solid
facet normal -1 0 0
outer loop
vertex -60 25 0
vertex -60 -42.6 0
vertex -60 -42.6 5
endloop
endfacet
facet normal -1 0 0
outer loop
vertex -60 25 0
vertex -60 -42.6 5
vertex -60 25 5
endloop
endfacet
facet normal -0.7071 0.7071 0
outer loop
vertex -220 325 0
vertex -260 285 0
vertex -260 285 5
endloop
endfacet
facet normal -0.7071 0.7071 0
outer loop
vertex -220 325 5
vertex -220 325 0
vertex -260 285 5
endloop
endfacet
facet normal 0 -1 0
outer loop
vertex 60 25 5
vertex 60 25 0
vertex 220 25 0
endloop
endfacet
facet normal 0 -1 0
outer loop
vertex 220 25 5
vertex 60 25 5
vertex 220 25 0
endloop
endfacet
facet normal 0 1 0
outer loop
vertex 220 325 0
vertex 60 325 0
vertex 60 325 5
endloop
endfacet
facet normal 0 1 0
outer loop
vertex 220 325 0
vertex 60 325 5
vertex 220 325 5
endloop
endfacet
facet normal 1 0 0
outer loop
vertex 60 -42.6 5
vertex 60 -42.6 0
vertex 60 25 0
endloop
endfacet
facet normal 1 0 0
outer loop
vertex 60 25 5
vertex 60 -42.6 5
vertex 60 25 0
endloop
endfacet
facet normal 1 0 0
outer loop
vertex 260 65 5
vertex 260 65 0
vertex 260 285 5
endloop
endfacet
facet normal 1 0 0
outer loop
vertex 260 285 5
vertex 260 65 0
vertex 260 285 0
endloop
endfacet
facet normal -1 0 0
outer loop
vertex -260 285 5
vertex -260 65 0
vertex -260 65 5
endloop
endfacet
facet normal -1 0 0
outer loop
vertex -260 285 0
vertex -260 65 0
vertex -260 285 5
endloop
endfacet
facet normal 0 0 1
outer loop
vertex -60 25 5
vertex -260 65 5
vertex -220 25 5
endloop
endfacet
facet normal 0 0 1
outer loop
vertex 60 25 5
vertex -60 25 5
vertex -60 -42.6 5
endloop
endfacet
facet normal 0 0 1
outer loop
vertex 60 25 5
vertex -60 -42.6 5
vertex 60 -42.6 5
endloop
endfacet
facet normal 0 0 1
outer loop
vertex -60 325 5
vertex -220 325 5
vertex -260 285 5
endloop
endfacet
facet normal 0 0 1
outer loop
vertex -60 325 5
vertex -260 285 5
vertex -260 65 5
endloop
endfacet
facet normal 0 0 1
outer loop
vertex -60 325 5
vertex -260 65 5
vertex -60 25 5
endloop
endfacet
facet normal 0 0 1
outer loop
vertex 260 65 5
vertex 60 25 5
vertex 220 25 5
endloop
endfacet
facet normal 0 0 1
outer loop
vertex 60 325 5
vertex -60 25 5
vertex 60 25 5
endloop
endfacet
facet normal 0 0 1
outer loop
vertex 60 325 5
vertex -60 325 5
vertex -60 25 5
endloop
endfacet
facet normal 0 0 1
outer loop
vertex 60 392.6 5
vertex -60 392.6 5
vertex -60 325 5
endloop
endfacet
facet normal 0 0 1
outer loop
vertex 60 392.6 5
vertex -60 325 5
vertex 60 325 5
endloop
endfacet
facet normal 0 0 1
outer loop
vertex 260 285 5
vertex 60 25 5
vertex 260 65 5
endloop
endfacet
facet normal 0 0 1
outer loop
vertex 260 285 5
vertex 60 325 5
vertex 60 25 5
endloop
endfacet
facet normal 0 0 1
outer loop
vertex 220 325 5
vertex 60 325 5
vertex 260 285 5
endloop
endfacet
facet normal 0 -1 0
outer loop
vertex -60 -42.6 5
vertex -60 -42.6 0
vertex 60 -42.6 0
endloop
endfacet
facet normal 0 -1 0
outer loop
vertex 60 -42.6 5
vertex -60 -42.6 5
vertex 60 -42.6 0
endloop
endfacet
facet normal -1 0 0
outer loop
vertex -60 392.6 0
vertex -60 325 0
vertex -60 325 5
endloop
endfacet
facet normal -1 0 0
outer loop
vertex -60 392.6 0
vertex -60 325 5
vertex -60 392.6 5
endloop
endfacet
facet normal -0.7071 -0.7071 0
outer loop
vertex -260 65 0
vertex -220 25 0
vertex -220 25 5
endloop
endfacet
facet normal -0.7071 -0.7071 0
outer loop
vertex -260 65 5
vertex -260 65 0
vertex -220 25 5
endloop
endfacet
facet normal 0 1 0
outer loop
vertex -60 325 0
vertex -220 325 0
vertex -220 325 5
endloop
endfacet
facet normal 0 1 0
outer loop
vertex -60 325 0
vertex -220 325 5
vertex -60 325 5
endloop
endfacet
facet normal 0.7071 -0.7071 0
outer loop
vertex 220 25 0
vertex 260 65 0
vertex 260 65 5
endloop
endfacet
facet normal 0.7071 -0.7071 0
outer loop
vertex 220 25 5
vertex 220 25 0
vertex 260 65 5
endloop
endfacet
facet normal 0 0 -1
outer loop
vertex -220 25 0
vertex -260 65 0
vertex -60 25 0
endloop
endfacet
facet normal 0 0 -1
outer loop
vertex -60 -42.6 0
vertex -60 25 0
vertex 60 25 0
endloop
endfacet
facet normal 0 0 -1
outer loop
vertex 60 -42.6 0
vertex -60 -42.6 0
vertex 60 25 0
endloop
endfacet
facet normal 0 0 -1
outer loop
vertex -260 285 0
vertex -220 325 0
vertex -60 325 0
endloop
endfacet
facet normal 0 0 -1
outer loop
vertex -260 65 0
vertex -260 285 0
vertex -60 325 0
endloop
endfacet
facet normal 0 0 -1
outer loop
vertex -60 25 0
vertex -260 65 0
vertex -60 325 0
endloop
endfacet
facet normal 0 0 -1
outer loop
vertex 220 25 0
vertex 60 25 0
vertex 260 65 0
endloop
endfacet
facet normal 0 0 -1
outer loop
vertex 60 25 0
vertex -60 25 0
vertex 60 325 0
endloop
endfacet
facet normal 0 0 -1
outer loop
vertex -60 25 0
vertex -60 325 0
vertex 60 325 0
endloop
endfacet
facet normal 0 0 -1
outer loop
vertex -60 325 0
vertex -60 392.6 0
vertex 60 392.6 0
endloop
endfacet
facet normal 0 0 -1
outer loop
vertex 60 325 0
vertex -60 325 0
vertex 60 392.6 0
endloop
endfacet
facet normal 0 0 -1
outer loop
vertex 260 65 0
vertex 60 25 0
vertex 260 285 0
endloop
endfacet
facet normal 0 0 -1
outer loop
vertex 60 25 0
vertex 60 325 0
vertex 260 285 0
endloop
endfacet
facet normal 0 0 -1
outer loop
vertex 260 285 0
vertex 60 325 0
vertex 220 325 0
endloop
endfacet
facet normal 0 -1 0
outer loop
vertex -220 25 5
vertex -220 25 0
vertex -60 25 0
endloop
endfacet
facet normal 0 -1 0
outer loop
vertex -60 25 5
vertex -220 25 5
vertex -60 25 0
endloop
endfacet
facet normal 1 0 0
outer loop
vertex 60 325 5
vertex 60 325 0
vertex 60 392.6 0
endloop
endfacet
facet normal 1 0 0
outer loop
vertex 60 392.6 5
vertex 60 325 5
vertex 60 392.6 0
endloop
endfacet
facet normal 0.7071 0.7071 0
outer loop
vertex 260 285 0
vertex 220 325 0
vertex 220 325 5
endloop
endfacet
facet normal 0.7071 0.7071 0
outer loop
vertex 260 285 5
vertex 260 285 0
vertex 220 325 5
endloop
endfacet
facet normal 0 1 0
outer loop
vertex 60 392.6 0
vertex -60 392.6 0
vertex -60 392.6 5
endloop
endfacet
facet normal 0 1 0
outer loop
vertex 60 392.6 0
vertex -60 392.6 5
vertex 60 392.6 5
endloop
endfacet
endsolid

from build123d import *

# Parameters (mm, degrees)
SKETCH1_W           = 120
SKETCH1_H           = 67.6
SKETCH1_W_2         = 200
SKETCH1_H_2         = 300
BOSS_EXTRUDE1_DEPTH = 5
CHAMFER1_SIZE       = 40


with BuildPart() as part:
    # Sketch1 → Boss-Extrude1 (new body)
    with BuildSketch(Plane.XY):
        with Locations((0, 358.8)):
            Rectangle(SKETCH1_W, SKETCH1_H)
        with Locations((-160, 175)):
            Rectangle(SKETCH1_W_2, SKETCH1_H_2)
        with Locations((0, 175)):
            Rectangle(SKETCH1_W, SKETCH1_H_2)
        with Locations((160, 175)):
            Rectangle(SKETCH1_W_2, SKETCH1_H_2)
        with Locations((0, -8.8)):
            Rectangle(SKETCH1_W, SKETCH1_H)
    extrude(amount=BOSS_EXTRUDE1_DEPTH)

    # Chamfer1
    chamfer1_edges = [part.edges().sort_by_distance(p)[0] for p in [
        (260, 325, 2.5),
        (260, 25, 2.5),
        (-260, 25, 2.5),
        (-260, 325, 2.5),
    ]]
    chamfer(chamfer1_edges, length=CHAMFER1_SIZE)


solid = part.part
